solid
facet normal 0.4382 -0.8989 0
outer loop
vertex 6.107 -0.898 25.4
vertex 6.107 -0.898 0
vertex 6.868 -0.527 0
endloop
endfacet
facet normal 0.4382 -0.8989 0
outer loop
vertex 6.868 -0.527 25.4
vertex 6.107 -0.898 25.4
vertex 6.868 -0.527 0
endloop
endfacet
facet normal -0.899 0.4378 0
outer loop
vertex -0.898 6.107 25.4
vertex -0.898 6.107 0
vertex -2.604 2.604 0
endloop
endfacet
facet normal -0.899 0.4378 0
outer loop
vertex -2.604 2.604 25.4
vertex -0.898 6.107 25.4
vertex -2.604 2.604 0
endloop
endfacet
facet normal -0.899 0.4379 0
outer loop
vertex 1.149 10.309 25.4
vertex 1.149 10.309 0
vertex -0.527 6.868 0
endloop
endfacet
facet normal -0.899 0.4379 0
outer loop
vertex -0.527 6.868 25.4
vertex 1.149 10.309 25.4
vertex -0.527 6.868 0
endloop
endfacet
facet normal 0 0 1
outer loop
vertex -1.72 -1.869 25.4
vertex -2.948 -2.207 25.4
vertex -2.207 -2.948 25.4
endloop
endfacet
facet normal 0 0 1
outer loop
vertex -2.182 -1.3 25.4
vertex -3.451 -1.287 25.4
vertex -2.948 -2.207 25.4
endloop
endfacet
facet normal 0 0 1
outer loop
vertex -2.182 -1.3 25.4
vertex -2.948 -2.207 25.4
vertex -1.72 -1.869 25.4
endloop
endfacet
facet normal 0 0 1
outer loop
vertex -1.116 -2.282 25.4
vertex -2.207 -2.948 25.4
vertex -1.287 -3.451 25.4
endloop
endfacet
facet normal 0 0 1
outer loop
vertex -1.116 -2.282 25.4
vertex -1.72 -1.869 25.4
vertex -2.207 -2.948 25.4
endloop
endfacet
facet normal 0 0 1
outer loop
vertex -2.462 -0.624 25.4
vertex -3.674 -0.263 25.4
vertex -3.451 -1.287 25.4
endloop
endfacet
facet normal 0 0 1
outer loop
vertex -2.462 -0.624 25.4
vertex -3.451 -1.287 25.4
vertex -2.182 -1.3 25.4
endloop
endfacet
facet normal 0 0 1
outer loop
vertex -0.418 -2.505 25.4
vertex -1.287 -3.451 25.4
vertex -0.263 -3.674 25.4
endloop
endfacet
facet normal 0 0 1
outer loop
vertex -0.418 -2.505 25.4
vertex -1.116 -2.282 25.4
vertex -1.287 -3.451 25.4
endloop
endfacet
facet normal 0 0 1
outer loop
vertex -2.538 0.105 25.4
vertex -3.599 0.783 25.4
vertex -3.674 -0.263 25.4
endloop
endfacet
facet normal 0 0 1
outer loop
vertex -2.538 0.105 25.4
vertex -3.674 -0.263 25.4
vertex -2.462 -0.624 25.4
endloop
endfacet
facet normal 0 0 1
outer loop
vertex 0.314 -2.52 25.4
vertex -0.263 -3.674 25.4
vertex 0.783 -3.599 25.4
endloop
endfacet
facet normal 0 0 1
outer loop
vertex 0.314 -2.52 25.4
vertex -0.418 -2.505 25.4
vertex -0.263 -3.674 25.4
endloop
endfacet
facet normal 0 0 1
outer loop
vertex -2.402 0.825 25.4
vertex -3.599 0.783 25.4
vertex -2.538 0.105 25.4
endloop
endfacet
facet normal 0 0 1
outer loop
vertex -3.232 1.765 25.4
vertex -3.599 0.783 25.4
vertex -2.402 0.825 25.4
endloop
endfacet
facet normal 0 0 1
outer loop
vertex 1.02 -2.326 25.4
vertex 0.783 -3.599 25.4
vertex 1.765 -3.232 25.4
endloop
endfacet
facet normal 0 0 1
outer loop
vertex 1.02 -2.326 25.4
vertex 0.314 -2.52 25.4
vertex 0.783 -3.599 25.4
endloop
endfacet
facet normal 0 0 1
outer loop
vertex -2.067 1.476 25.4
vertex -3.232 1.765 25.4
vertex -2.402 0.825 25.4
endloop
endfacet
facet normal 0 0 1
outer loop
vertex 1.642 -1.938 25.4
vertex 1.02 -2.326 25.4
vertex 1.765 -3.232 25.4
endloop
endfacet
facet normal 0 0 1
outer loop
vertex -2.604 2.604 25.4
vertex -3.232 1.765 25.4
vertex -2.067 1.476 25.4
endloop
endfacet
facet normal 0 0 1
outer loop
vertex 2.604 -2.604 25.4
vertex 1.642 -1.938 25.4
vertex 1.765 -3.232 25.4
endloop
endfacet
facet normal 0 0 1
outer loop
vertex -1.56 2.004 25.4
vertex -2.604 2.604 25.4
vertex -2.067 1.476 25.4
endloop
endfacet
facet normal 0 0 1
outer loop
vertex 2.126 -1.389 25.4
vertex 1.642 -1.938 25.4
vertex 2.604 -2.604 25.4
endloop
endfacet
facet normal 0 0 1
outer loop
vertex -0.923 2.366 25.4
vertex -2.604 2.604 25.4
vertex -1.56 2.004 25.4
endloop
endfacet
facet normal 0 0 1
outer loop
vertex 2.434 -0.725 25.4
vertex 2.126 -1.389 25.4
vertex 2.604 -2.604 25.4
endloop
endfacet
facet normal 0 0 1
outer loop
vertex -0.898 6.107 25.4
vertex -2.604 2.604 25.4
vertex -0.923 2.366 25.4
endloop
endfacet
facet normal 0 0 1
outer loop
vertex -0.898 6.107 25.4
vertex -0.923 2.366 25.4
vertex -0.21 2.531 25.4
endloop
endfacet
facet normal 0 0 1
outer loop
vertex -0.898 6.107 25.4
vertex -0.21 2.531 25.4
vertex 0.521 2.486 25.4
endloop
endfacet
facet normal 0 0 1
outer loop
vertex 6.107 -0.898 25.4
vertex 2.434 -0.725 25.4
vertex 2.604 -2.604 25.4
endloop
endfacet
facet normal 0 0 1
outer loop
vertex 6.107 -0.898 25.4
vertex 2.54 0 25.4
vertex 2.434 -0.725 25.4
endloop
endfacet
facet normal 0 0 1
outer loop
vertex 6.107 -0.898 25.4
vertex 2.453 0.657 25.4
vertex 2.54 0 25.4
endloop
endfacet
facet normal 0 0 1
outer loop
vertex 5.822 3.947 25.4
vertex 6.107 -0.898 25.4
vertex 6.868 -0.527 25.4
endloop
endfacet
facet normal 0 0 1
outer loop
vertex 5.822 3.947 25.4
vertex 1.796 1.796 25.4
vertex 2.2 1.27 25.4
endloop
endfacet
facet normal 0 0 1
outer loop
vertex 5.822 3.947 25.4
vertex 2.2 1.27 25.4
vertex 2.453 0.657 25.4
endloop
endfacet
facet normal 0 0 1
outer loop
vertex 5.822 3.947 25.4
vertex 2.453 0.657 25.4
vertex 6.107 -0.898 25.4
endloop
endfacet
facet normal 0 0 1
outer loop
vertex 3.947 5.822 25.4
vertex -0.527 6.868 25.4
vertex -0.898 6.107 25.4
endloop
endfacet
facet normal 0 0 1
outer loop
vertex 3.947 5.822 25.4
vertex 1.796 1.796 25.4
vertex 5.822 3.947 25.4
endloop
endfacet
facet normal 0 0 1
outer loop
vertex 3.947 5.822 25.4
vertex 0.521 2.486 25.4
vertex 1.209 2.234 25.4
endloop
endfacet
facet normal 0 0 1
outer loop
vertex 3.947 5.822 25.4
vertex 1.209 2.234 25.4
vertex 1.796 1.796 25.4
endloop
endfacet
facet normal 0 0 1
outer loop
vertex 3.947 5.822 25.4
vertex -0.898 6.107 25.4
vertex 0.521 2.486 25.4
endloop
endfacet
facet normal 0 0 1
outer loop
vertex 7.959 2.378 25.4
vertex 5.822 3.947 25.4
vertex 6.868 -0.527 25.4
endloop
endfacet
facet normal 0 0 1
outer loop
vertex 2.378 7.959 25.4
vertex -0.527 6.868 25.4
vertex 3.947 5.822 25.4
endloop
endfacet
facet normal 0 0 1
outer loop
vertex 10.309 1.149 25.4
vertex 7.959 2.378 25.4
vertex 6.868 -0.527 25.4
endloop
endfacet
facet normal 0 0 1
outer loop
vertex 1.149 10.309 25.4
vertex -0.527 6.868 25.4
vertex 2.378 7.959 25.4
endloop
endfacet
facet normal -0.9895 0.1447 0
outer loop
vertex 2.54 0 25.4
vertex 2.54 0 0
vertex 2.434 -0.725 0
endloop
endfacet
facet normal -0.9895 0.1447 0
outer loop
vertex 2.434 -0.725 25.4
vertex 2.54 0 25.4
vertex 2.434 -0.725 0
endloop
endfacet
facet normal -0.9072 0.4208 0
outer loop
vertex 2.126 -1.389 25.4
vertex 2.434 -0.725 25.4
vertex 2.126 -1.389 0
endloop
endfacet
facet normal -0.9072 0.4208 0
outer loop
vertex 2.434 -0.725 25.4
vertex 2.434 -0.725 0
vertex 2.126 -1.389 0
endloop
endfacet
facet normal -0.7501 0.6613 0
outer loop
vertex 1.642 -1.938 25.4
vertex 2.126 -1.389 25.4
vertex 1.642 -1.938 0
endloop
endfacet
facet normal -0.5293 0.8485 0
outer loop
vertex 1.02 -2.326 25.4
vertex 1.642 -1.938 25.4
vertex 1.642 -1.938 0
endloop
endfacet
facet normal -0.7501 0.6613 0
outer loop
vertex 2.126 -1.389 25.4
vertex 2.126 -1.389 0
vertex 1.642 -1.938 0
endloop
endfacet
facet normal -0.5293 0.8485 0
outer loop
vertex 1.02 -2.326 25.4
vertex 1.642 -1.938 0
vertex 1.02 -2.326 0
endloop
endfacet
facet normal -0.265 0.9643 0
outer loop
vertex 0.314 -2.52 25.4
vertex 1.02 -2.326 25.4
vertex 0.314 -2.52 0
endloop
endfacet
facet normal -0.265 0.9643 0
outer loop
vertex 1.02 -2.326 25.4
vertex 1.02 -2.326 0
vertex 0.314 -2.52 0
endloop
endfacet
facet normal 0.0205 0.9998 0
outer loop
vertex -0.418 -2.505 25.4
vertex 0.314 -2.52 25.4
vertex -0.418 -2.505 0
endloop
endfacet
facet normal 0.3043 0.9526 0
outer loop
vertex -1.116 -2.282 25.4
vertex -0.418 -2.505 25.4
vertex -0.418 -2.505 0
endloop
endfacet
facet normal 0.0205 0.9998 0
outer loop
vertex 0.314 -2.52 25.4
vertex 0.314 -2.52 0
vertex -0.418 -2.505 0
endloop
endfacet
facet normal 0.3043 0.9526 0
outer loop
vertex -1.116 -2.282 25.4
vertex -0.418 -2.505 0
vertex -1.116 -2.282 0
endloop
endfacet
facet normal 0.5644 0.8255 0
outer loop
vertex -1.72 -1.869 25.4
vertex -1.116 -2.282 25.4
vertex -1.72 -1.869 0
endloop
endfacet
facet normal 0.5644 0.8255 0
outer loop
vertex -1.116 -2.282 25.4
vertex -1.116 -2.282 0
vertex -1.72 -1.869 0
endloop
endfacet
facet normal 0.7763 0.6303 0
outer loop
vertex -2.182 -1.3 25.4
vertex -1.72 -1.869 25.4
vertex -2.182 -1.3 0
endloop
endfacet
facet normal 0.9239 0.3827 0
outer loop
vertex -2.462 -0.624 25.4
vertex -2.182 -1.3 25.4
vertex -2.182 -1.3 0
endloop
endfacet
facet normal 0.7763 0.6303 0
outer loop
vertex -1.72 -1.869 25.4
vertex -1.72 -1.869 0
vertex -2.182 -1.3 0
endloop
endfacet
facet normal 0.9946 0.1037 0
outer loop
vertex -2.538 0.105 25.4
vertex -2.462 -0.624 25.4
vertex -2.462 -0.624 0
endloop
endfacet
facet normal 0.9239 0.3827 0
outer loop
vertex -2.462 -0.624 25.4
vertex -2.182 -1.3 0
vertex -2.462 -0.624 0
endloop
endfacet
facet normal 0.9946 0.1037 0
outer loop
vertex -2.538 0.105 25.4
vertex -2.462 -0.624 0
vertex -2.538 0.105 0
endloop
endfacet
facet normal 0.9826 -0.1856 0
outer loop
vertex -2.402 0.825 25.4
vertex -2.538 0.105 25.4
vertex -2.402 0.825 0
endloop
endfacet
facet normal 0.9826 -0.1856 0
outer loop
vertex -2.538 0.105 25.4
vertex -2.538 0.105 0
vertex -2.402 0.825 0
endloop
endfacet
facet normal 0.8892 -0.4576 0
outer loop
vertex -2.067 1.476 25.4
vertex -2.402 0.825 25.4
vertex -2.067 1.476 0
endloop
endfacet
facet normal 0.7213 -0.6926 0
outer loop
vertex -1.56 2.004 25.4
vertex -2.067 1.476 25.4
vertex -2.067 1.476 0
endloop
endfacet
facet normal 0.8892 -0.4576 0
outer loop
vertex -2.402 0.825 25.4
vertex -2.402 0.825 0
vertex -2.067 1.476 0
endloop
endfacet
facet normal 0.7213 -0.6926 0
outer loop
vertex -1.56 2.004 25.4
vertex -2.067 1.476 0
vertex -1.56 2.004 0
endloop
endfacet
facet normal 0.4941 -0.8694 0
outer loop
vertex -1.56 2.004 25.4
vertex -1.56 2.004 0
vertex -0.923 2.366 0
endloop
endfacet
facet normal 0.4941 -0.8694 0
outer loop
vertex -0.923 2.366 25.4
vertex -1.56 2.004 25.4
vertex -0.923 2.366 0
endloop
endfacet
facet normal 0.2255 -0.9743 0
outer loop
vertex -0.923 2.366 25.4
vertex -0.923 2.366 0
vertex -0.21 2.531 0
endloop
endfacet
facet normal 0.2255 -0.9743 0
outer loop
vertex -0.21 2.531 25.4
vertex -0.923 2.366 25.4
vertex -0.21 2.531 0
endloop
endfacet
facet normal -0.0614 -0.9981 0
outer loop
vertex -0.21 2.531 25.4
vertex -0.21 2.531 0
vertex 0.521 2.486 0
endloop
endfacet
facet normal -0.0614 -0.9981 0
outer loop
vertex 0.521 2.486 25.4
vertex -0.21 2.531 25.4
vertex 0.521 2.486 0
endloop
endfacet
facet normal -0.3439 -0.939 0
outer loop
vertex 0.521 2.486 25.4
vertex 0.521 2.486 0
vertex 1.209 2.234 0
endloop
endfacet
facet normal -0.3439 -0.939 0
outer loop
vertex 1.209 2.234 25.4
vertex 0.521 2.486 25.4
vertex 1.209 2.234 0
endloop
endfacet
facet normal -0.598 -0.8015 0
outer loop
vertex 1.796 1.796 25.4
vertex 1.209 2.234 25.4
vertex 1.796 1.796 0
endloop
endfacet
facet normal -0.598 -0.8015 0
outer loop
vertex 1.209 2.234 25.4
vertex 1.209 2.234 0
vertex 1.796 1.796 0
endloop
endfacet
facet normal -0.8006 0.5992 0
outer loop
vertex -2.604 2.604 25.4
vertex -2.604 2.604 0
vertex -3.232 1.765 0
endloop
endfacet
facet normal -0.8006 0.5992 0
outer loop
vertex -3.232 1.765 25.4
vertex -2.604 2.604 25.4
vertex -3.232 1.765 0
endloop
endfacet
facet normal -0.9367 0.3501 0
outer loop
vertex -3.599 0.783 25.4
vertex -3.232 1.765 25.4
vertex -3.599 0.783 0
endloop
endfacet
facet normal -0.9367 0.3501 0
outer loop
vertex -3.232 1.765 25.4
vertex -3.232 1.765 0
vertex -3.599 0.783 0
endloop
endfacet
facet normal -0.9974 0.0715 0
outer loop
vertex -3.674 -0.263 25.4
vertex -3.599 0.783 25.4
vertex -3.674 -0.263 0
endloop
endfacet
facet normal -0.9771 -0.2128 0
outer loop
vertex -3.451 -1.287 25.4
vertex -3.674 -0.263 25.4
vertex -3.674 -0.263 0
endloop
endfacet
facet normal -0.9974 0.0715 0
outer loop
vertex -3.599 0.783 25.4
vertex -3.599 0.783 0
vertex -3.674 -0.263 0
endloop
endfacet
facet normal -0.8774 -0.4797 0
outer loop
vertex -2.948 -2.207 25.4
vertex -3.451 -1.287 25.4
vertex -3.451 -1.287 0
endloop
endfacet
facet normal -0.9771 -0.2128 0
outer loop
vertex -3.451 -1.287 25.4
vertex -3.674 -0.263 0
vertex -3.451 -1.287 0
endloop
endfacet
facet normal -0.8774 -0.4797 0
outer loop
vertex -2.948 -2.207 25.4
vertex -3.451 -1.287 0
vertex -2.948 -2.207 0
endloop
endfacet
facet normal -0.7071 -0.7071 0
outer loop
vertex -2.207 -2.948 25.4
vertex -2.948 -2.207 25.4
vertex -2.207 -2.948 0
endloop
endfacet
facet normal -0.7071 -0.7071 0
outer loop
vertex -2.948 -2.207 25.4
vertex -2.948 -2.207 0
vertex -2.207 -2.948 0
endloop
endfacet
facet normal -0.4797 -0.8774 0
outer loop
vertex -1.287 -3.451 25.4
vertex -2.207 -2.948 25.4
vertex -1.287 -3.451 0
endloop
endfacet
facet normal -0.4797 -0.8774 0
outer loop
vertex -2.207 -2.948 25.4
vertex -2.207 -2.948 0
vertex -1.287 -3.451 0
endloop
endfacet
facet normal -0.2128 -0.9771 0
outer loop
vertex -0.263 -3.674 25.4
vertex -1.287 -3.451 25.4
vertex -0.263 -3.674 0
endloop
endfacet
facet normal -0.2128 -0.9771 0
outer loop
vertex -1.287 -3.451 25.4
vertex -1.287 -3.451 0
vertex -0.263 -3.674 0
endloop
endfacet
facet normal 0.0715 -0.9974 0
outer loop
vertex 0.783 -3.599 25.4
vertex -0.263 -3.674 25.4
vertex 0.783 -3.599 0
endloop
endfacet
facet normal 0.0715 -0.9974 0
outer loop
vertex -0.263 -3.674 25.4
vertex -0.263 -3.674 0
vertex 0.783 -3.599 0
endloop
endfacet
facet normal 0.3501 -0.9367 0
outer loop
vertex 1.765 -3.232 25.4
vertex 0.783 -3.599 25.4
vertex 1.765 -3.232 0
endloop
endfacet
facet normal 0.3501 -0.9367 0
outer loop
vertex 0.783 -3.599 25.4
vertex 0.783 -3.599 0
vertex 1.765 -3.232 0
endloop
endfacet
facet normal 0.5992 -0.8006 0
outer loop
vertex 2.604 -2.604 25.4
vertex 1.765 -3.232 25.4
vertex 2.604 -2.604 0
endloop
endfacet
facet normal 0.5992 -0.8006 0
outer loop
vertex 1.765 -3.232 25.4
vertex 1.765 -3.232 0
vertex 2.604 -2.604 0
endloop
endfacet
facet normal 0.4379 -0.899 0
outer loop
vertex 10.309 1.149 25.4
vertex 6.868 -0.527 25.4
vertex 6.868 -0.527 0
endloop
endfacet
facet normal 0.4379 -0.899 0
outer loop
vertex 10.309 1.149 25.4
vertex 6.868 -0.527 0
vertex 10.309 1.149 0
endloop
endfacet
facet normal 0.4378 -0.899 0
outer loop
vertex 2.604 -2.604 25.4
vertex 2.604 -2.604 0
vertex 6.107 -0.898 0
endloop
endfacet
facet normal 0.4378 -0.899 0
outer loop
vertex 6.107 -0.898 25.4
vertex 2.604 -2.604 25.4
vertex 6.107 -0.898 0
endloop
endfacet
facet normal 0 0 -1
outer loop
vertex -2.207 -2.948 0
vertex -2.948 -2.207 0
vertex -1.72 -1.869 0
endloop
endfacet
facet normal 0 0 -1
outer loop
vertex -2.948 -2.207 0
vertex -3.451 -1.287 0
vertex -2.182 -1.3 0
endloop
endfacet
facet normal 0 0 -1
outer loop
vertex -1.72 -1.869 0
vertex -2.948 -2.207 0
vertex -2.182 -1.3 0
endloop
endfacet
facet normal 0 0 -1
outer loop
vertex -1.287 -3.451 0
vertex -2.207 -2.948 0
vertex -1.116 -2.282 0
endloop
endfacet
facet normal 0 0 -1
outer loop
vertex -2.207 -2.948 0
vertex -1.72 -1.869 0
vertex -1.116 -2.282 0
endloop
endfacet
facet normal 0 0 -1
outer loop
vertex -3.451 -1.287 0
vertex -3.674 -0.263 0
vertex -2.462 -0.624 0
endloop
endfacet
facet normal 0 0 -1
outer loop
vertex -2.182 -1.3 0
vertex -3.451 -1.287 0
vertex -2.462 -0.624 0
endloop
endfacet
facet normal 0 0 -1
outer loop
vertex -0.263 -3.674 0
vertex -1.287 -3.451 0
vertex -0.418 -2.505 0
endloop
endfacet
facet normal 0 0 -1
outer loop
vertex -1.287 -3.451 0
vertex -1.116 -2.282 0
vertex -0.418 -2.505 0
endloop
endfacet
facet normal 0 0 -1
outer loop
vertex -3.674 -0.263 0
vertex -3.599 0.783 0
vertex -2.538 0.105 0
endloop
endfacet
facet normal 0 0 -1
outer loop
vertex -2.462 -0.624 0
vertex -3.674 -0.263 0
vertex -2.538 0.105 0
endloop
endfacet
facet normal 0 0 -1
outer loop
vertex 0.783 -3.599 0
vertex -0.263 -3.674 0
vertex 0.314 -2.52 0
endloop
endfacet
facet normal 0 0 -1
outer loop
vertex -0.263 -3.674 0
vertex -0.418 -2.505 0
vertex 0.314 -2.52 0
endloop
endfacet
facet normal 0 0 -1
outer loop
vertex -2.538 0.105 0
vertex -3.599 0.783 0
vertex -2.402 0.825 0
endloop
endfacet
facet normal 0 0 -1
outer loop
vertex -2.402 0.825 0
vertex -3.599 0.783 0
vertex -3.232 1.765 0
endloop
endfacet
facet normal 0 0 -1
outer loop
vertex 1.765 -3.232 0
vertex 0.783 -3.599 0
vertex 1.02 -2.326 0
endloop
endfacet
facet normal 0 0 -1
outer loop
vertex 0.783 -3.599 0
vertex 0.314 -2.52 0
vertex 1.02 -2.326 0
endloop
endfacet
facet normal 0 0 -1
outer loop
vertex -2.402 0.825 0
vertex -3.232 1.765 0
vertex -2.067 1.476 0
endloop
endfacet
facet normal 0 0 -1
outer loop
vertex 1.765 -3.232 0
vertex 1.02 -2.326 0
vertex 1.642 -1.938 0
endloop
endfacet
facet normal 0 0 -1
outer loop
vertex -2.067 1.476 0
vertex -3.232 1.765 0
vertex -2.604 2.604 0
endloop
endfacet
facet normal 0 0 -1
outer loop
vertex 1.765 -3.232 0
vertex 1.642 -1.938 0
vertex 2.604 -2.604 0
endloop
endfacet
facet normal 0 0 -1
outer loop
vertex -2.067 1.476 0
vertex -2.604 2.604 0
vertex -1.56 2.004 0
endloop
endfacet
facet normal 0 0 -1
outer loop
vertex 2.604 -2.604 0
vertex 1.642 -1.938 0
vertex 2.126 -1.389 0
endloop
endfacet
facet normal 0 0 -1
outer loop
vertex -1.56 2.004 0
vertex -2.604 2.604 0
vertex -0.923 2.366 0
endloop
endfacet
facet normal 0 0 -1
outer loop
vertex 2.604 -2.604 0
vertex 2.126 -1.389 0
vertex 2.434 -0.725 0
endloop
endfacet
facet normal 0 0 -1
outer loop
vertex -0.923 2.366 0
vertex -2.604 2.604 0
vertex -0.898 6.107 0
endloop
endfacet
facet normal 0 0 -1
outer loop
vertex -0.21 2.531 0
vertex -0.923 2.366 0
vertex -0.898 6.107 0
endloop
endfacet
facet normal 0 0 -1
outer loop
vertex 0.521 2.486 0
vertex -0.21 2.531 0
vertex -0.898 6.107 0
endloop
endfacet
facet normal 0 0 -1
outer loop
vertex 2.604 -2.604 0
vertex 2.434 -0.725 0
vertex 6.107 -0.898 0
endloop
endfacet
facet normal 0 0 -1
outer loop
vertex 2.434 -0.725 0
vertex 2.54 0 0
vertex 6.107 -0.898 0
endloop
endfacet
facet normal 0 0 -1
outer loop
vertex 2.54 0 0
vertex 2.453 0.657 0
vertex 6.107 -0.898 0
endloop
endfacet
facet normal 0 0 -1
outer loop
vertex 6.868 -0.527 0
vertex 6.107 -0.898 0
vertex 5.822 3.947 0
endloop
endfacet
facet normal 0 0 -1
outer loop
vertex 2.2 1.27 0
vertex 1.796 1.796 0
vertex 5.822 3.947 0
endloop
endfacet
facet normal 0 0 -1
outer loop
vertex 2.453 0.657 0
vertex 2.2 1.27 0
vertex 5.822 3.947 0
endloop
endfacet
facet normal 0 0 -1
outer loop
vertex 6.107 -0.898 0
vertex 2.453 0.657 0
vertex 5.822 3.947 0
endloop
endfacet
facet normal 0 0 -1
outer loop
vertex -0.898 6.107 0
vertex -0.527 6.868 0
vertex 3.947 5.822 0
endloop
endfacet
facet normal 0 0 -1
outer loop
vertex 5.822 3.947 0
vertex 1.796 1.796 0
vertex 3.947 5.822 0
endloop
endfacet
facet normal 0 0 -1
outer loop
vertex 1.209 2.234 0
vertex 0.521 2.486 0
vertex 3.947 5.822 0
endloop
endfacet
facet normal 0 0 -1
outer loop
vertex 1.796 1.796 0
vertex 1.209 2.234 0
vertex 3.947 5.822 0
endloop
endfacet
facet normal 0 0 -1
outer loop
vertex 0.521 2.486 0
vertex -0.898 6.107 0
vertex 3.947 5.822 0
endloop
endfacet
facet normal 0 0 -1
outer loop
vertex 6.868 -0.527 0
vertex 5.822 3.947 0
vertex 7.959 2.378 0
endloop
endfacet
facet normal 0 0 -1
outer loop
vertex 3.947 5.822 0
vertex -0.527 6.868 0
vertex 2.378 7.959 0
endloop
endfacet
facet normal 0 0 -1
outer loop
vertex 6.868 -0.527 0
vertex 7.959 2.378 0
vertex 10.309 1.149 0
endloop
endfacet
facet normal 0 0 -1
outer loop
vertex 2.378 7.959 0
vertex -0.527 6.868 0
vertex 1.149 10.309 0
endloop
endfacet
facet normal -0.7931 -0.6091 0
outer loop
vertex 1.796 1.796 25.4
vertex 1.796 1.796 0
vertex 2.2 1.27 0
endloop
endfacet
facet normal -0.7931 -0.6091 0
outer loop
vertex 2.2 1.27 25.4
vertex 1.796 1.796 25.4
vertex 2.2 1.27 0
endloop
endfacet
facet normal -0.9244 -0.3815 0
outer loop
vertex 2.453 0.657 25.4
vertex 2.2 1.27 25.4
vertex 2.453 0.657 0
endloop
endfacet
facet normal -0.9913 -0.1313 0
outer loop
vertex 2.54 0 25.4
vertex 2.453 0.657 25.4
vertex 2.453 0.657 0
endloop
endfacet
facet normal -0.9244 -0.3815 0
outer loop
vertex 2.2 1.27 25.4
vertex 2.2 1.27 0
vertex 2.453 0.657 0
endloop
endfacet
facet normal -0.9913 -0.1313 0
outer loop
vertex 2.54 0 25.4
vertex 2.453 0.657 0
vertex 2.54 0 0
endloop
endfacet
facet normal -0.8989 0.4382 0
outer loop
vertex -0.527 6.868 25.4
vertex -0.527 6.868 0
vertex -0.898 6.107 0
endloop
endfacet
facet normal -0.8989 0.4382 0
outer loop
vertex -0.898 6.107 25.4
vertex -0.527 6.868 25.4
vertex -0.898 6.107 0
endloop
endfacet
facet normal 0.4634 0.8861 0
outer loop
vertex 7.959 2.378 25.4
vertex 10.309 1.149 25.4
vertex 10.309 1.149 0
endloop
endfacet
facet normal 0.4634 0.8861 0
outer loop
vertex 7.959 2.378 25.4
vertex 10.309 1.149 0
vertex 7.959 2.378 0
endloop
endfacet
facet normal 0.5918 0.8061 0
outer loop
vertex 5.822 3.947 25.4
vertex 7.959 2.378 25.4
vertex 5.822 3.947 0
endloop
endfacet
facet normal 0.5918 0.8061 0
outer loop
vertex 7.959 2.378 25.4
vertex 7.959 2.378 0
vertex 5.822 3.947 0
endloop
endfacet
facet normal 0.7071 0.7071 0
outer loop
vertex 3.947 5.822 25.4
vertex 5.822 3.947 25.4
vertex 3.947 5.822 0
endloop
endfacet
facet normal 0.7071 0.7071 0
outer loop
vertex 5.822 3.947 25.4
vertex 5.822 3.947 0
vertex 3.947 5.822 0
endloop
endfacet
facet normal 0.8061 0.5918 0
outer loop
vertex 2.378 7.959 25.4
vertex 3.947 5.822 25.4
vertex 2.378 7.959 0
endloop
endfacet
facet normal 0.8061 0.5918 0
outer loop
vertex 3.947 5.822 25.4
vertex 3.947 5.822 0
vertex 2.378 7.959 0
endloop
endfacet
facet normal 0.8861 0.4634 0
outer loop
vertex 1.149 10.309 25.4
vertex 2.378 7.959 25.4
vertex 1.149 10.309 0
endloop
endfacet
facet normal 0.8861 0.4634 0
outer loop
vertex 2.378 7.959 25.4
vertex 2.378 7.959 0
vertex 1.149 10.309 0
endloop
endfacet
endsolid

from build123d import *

# Parameters (mm, degrees)
F1_DEPTH = 25.4


with BuildPart() as f1:
    # F0 (on Top) → F1 (new body)
    with BuildSketch(Plane.XY):
        with BuildLine():
            Line((-0.898026, 6.106574), (-2.604274, 2.604274))
            ThreePointArc((-2.604274, 2.604274), (-2.604274, -2.604274), (2.604274, -2.604274))
            Line((2.604274, -2.604274), (6.106574, -0.898026))
            Line((6.106574, -0.898026), (6.867985, -0.527082))
            Line((6.867985, -0.527082), (10.309378, 1.149494))
            ThreePointArc((10.309378, 1.149494), (4.849338, 4.849338), (1.149494, 10.309378))
            Line((1.149494, 10.309378), (-0.527082, 6.867985))
            Line((-0.527082, 6.867985), (-0.898026, 6.106574))
        make_face()
        with BuildLine():
            ThreePointArc((1.796051, 1.796051), (2.346654, 0.972016), (2.54, 0))
            ThreePointArc((2.54, 0), (-2.346654, -0.972016), (1.796051, 1.796051))
        make_face(mode=Mode.SUBTRACT)
    extrude(amount=F1_DEPTH)


solid = f1.part
